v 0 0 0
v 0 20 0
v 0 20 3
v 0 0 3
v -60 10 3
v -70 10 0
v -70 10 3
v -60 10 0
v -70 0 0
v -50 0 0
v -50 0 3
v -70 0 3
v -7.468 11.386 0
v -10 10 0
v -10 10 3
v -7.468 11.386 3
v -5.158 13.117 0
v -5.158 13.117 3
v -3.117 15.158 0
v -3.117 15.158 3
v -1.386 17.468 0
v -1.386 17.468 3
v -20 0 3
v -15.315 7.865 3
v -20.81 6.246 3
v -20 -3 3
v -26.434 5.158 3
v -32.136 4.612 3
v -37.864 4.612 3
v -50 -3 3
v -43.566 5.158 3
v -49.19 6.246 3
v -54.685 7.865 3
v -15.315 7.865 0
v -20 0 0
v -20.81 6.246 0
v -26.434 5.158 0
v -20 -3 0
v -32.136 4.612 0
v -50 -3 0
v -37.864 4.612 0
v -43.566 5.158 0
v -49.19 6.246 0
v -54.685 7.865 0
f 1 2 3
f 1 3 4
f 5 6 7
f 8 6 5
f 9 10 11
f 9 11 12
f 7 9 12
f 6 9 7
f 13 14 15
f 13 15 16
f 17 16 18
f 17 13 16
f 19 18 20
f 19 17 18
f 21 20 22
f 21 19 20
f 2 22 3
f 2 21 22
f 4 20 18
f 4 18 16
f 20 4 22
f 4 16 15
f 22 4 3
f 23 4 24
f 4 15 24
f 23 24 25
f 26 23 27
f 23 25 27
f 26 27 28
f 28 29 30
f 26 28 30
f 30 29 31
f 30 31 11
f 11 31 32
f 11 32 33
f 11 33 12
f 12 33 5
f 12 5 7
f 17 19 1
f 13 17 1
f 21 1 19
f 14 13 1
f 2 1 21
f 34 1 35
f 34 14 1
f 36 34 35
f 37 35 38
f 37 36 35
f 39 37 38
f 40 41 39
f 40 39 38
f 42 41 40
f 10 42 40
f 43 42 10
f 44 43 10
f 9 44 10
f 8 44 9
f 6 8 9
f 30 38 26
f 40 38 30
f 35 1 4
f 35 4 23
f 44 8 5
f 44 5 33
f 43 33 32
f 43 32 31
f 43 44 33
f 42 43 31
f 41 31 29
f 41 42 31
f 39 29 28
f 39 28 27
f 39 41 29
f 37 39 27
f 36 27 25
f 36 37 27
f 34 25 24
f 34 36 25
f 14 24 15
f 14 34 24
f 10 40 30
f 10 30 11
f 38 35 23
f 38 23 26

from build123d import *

# Parameters (mm, degrees)
BOSS_EXTRUDE1_DEPTH = 3


with BuildPart() as part:
    # Sketch1 → Boss-Extrude1 (new body)
    with BuildSketch(Plane.XY):
        with BuildLine():
            Line((0, 0), (-20, 0))
            Line((-20, 0), (-20, -3))
            Line((-20, -3), (-50, -3))
            Line((-50, -3), (-50, 0))
            Line((-50, 0), (-70, 0))
            Line((-70, 0), (-70, 10))
            Line((-70, 10), (-60, 10))
            ThreePointArc((-60, 10), (-35, 4.543560573), (-10, 10))
            ThreePointArc((-10, 10), (-4.101453402, 14.101453402), (0, 20))
            Line((0, 20), (0, 0))
        make_face()
    extrude(amount=BOSS_EXTRUDE1_DEPTH)


solid = part.part
